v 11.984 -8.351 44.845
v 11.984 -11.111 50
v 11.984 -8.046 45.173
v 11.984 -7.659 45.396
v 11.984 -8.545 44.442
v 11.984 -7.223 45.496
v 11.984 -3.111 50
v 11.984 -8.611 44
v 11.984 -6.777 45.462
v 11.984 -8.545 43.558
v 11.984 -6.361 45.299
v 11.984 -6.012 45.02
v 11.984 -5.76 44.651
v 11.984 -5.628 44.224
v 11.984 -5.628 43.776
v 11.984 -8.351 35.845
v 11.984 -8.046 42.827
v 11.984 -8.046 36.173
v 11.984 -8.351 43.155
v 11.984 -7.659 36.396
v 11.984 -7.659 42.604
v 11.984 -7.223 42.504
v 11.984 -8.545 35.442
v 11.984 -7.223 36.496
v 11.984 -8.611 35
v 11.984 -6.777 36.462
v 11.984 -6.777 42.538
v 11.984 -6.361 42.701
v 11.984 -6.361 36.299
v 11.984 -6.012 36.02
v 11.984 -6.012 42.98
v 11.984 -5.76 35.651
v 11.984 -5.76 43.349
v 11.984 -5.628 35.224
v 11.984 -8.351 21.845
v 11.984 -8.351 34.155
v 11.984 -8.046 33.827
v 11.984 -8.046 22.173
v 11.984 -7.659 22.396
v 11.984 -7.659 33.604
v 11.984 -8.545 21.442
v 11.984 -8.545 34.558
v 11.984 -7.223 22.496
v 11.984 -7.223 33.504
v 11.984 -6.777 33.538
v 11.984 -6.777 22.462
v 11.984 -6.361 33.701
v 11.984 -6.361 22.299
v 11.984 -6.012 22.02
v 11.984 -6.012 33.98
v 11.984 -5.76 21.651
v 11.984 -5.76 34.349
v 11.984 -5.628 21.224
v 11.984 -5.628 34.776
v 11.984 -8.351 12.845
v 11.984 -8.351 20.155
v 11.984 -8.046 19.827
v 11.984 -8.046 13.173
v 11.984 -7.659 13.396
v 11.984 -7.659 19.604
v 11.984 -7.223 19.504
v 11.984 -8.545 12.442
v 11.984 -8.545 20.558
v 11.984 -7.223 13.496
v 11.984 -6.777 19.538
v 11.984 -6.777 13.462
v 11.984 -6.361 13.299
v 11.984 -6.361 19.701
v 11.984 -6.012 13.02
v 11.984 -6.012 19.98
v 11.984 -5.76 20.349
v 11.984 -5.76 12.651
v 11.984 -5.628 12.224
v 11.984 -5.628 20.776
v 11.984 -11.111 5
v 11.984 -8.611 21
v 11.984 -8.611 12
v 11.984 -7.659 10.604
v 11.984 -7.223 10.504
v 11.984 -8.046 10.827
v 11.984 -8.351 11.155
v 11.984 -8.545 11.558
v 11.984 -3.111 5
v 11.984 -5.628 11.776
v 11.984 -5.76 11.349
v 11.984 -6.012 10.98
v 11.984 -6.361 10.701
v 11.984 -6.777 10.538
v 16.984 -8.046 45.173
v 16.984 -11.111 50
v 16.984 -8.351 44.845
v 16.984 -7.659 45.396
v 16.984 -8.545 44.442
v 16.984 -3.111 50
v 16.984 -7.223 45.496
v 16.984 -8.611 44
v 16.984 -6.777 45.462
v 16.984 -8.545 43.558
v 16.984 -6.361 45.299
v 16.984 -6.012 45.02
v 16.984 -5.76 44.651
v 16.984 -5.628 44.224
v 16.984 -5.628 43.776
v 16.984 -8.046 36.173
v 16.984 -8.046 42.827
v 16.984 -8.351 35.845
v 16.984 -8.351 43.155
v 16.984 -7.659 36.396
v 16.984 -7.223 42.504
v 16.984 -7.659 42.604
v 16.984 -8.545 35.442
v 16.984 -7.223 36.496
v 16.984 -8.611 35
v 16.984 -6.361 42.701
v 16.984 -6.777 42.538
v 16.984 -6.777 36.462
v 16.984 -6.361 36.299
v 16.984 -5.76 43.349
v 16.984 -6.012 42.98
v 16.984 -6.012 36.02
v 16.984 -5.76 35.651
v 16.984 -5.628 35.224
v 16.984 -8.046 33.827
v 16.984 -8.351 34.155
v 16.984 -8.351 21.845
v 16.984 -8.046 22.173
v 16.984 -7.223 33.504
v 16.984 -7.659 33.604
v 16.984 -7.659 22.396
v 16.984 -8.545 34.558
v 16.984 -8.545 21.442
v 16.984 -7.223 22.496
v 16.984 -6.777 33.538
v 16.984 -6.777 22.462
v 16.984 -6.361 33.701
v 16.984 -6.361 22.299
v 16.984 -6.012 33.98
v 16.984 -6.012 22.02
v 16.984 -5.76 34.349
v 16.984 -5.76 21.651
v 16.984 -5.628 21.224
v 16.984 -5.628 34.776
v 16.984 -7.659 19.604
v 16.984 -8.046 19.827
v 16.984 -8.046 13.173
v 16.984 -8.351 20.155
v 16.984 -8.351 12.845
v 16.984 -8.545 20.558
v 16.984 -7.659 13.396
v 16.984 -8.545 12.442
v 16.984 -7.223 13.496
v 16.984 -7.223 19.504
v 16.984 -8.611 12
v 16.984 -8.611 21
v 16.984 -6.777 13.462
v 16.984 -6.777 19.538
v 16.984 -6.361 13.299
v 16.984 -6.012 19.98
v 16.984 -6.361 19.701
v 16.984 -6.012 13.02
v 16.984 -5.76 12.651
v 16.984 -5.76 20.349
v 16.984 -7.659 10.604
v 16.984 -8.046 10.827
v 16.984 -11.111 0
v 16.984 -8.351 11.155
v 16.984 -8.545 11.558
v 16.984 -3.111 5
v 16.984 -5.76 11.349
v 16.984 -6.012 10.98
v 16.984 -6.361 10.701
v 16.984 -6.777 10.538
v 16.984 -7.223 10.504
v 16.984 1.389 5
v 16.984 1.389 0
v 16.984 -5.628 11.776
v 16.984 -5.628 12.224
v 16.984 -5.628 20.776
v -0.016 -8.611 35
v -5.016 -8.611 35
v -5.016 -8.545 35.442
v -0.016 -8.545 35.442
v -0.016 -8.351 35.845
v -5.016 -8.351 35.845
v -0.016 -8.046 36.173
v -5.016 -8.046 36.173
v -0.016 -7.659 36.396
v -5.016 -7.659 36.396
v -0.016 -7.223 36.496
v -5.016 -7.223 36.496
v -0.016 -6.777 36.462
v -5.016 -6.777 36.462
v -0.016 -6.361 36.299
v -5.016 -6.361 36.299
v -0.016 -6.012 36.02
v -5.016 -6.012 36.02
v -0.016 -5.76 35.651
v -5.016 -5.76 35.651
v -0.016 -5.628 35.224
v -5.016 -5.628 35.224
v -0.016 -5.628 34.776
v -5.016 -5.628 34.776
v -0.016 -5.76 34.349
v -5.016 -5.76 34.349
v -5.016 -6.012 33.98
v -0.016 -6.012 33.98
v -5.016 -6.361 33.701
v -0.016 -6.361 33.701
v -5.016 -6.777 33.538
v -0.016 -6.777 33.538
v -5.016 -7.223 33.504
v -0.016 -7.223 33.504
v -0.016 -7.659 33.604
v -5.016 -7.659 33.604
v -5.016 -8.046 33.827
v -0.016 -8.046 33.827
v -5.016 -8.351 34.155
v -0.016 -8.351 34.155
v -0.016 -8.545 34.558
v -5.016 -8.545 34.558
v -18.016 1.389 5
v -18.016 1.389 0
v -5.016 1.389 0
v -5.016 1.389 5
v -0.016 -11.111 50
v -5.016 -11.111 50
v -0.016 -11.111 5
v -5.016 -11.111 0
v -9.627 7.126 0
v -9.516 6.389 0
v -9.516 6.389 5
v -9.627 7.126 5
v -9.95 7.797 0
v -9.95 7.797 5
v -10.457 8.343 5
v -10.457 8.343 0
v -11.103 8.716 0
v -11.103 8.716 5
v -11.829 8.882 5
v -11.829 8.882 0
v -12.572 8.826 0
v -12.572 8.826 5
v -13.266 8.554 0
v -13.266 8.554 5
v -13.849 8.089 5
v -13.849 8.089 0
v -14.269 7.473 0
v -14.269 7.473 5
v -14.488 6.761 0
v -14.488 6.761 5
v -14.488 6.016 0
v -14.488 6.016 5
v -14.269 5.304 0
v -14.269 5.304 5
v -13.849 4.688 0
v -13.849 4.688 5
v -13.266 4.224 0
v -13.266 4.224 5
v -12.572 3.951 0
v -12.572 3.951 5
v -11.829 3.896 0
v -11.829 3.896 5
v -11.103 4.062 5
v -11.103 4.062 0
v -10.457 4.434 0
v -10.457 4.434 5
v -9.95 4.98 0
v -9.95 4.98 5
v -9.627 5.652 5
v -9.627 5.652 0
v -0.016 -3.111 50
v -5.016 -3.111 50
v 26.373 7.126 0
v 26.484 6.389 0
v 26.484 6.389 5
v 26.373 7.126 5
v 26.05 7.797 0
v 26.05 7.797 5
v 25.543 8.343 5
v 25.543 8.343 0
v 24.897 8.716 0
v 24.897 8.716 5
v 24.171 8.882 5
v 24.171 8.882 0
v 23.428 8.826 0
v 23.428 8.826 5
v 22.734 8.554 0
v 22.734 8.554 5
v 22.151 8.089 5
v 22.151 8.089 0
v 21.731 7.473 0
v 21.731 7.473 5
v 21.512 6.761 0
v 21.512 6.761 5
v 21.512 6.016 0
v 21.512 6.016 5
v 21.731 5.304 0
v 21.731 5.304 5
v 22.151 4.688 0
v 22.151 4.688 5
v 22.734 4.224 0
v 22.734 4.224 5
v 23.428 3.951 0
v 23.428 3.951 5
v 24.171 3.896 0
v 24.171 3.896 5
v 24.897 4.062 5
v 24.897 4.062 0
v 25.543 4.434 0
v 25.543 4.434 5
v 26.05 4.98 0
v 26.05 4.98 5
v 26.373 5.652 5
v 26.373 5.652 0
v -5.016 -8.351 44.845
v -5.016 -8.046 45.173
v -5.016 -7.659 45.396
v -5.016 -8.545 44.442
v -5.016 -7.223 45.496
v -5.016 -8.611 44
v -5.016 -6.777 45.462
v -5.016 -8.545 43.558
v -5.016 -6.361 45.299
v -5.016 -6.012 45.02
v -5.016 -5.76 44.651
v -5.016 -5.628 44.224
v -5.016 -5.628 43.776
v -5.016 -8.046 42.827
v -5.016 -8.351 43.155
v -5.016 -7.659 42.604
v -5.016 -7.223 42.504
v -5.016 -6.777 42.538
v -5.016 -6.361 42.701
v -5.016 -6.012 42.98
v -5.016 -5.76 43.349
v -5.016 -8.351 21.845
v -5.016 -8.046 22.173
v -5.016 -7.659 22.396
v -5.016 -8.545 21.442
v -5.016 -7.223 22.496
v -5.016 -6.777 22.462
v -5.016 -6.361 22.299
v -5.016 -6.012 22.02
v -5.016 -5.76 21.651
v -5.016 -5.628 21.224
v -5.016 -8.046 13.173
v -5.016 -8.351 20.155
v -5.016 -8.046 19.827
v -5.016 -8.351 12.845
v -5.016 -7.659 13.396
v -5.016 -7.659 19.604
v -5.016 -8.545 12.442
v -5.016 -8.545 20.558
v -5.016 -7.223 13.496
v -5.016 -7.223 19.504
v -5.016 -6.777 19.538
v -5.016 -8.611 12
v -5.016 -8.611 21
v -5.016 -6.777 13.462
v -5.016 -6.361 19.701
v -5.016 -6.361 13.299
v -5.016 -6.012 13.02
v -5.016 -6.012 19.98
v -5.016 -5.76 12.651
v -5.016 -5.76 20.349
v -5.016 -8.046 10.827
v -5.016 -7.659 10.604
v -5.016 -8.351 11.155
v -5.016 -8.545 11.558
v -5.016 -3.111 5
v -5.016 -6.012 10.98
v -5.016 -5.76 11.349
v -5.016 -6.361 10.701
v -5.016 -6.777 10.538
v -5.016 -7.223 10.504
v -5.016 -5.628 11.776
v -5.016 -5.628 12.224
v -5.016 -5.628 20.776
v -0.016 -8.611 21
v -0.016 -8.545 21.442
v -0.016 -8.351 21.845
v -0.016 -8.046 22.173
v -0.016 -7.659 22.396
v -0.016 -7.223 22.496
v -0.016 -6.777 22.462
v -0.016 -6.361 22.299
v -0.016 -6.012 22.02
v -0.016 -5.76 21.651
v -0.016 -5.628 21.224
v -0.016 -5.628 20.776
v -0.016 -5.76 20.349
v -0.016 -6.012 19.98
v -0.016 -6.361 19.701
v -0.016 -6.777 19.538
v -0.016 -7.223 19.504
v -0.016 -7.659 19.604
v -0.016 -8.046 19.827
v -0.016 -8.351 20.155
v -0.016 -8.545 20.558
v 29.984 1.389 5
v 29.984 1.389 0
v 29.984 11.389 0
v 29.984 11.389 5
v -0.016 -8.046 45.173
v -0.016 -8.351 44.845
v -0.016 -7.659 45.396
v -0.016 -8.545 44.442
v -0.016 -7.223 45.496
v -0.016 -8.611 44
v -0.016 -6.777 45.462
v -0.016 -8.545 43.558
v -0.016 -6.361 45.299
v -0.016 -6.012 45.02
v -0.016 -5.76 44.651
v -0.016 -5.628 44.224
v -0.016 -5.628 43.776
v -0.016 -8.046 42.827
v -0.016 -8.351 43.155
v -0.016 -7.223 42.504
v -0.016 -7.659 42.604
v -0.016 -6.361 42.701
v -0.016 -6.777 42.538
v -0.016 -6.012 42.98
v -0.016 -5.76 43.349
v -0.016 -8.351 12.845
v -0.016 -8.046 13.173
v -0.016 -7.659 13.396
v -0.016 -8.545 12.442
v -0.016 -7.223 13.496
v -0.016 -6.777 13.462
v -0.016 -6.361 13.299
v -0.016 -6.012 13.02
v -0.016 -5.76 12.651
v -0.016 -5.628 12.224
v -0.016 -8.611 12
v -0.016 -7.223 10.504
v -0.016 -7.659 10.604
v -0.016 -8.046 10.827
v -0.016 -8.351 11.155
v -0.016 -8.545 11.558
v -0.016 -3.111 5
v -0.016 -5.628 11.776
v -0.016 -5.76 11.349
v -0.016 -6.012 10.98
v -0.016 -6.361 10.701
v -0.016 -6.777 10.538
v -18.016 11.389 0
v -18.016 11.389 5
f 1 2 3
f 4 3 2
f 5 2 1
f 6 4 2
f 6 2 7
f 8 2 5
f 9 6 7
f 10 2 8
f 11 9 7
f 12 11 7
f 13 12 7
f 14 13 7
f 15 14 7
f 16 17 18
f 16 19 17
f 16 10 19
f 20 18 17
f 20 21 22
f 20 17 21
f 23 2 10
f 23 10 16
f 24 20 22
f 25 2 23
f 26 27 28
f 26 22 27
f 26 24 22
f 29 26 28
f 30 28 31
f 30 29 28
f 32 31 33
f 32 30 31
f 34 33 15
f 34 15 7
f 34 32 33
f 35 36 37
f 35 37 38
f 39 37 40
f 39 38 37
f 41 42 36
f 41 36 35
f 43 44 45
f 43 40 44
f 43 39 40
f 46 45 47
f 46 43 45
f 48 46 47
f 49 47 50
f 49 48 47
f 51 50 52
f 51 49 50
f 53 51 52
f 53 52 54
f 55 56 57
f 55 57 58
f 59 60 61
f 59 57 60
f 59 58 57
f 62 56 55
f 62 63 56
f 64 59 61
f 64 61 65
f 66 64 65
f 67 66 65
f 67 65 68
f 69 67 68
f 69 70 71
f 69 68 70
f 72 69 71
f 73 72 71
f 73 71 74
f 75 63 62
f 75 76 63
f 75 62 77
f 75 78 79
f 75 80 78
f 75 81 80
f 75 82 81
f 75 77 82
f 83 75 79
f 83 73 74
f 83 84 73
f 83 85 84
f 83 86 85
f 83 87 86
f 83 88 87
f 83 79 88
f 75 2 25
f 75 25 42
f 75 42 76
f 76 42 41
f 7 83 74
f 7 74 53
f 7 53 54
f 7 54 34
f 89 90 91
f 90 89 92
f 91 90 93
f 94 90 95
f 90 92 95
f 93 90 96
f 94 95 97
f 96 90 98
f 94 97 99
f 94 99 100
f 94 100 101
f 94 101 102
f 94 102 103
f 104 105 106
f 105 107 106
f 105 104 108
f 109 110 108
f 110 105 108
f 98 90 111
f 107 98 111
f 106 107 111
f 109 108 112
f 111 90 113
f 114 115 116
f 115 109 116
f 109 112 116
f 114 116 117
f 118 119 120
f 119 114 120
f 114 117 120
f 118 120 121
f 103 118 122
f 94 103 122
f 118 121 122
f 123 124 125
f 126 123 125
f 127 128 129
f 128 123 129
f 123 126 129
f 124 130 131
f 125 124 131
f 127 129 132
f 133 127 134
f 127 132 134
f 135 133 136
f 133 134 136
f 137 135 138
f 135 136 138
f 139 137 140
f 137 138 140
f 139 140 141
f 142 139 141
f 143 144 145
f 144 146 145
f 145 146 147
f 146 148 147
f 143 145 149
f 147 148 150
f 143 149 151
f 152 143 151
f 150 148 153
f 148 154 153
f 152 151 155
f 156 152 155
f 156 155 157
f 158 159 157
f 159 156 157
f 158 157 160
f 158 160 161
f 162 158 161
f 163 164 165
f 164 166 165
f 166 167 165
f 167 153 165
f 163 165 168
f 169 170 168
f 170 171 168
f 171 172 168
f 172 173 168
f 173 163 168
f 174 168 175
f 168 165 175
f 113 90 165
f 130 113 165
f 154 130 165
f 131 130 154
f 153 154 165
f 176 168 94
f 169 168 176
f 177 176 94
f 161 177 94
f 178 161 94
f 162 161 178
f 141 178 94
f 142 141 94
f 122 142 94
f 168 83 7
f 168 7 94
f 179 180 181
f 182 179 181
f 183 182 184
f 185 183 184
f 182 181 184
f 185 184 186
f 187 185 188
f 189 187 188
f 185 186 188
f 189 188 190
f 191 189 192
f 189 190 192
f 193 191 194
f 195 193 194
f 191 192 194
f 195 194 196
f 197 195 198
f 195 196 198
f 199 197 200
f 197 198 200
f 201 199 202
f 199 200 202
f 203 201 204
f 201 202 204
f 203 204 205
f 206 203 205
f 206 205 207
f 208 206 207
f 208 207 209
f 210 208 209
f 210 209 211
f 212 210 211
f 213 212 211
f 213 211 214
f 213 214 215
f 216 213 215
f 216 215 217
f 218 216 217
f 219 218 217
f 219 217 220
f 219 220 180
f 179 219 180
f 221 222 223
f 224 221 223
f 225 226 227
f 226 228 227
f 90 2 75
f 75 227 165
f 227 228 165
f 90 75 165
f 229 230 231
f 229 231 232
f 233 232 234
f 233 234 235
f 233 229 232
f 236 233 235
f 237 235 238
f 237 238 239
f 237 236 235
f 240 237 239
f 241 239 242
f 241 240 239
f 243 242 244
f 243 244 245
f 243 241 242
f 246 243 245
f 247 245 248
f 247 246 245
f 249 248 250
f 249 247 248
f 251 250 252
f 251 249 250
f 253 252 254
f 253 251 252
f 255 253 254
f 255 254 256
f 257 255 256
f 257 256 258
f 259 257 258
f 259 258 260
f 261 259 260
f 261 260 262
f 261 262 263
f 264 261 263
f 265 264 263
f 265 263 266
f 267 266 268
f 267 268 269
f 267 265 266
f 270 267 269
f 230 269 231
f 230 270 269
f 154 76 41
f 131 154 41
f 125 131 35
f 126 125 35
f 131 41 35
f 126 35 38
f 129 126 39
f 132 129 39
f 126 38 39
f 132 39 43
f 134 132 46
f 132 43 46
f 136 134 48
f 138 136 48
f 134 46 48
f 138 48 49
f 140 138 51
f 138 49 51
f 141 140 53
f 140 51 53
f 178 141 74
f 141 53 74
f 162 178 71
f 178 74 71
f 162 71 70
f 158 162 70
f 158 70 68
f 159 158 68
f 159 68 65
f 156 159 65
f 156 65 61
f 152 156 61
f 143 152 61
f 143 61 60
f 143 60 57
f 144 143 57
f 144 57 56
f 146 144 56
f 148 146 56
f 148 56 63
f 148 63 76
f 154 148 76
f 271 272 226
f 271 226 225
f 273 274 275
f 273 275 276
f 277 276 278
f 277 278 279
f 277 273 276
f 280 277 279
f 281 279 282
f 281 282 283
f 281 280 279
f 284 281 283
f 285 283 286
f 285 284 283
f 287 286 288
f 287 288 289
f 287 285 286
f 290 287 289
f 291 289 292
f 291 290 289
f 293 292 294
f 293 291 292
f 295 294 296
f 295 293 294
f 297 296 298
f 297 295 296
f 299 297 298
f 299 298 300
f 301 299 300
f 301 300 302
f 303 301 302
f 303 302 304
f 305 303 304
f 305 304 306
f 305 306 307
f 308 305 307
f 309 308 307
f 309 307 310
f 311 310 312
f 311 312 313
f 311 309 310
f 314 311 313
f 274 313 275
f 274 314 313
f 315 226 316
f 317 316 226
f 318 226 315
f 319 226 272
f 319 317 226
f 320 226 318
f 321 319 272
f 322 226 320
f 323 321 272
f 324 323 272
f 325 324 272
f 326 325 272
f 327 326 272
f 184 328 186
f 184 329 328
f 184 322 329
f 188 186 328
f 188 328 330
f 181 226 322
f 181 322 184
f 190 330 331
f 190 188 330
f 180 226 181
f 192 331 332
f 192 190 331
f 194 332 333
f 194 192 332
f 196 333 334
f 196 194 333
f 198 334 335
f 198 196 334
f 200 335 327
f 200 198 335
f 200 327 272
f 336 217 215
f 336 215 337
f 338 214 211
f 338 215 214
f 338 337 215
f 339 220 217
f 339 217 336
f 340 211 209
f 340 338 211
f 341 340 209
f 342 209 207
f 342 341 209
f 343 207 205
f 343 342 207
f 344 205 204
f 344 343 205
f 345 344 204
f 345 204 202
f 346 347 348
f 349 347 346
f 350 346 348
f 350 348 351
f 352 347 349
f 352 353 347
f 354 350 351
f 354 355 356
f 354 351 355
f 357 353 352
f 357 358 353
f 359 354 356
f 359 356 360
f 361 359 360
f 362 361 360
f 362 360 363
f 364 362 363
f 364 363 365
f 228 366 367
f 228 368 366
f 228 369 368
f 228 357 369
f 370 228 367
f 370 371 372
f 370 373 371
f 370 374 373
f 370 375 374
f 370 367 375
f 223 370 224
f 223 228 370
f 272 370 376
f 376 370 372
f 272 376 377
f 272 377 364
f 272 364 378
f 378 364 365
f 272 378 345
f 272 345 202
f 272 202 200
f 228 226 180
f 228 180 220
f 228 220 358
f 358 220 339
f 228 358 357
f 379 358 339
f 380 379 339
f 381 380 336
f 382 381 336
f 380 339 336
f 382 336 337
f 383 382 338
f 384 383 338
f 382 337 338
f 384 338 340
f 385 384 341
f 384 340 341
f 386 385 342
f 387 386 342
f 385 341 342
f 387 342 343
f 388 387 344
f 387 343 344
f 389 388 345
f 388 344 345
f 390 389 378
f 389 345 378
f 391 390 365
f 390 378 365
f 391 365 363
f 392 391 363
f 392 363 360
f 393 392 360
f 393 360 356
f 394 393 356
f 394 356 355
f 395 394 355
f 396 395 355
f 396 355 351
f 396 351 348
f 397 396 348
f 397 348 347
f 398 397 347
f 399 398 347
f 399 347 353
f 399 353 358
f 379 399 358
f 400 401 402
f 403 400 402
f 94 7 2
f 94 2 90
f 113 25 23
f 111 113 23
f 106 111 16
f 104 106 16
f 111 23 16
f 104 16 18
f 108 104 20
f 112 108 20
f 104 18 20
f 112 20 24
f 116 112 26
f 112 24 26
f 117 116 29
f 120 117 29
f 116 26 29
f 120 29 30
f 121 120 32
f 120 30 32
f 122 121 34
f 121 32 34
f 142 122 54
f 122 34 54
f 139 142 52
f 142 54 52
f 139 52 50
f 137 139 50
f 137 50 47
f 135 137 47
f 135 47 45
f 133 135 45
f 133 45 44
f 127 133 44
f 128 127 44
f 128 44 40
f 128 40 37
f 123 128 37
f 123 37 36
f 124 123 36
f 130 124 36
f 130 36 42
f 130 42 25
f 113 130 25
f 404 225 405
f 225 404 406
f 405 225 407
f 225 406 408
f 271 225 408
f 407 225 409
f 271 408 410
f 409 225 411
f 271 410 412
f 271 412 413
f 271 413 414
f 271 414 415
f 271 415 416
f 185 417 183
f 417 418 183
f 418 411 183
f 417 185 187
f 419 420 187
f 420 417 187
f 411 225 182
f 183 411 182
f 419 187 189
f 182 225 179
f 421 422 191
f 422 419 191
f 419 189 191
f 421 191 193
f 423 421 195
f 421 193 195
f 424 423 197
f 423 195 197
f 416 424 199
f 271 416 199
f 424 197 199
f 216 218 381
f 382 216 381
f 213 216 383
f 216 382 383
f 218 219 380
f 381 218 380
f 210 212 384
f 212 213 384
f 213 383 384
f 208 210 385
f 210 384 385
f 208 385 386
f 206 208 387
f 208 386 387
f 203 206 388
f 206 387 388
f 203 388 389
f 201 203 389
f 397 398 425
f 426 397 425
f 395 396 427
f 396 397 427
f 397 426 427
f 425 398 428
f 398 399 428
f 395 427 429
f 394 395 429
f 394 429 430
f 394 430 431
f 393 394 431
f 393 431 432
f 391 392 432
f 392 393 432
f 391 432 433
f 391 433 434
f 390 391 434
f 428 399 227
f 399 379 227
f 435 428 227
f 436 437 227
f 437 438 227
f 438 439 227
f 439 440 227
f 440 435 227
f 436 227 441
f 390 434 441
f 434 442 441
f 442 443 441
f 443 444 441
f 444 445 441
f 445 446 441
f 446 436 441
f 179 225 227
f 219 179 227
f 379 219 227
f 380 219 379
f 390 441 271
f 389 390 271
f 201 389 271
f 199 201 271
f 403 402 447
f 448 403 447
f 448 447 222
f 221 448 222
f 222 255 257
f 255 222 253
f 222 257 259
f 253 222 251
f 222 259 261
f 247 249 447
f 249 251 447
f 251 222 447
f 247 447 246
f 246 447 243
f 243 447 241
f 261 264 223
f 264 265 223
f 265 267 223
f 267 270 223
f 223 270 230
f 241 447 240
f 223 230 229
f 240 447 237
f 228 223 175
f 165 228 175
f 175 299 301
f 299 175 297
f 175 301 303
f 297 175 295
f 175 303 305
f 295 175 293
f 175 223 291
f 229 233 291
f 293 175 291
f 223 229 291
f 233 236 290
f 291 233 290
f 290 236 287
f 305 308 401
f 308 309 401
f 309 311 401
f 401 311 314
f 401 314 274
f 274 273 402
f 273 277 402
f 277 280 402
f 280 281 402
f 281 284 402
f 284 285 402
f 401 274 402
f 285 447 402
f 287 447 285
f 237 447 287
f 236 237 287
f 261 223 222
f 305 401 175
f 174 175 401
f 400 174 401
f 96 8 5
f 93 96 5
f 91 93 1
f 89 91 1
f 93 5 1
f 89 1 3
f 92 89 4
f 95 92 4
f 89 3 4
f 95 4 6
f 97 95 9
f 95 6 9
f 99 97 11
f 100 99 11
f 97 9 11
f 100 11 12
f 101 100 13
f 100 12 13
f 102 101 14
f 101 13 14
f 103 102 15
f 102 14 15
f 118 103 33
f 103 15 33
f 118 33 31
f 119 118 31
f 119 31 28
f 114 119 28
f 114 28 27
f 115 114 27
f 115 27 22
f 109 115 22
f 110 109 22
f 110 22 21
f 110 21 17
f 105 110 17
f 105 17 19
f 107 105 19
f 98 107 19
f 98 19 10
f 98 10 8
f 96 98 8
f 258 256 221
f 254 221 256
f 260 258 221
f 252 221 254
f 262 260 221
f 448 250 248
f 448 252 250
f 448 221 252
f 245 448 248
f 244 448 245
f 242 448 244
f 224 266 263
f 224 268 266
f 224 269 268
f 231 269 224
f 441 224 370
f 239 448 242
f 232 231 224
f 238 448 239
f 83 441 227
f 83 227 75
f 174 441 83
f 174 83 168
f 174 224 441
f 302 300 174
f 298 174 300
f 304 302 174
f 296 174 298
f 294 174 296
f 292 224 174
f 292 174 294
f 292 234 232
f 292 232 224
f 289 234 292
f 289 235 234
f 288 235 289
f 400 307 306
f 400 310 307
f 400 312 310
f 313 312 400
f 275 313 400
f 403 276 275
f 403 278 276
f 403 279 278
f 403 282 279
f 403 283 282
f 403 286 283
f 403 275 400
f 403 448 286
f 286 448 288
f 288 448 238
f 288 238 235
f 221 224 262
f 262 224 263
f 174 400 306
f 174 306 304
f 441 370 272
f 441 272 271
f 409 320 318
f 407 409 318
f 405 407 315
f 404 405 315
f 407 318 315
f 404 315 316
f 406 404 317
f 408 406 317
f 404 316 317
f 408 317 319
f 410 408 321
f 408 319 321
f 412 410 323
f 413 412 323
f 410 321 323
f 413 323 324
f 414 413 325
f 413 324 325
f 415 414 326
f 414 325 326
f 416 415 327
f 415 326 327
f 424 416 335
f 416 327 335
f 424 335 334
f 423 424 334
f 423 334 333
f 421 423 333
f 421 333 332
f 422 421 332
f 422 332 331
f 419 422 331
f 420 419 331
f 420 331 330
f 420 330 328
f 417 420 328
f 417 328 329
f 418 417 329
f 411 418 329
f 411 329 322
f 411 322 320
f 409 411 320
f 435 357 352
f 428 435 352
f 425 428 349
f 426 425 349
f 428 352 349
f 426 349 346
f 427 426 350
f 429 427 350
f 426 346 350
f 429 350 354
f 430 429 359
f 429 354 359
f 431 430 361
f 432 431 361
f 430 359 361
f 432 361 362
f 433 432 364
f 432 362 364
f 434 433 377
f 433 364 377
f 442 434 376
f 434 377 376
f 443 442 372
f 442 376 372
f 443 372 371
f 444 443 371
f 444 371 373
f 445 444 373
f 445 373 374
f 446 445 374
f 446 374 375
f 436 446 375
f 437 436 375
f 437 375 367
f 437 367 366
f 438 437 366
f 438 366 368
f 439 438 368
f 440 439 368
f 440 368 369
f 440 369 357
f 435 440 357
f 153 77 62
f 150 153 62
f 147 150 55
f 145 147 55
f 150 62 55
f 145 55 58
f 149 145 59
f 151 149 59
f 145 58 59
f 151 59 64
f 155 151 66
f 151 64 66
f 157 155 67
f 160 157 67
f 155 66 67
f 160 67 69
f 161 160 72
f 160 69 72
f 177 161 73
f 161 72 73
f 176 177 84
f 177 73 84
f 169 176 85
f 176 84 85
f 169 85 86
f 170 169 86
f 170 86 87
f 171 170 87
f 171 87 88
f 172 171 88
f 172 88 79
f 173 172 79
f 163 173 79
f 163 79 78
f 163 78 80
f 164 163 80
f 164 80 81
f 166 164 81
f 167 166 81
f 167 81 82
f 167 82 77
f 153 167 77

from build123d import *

# Parameters (mm, degrees)
SKETCH_1_R          = 2.5
SKETCH_1_W          = 22
SKETCH_1_H          = 12.5
SKETCH_1_H_2        = 5
EXTRUDE_2_DEPTH     = 5
SKETCH_2_W          = 5
SKETCH_2_H          = 8
EXTRUDE_3_DEPTH     = 45
SKETCH_3_R          = 1.5
CUT_EXTRUDE_1_DEPTH = 45
SKETCH_5_R          = 1.5
CUT_EXTRUDE_2_DEPTH = 45


with BuildPart() as part:
    # 草图1 → 凸台-拉伸2 (new body)
    # profile 1 of 3: a face of its own
    with BuildSketch(Plane.XY):
        Polygon((29.983914209, 11.388739946), (-18.016085791, 11.388739946), (-18.016085791, 1.388739946), (-5.016085791, 1.388739946), (-5.016085791, 6.388739946), (16.983914209, 6.388739946), (16.983914209, 1.388739946), (29.983914209, 1.388739946), align=None)
        with Locations((-12.016085791, 6.388739946)):
            Circle(SKETCH_1_R, mode=Mode.SUBTRACT)
        with Locations((23.983914209, 6.388739946)):
            Circle(SKETCH_1_R, mode=Mode.SUBTRACT)
    # profile 2 of 3: a face of its own
    with BuildSketch(Plane.XY):
        with Locations((5.983914209, -4.861260054)):
            Rectangle(SKETCH_1_W, SKETCH_1_H)
    # profile 3 of 3: a face of its own
    with BuildSketch(Plane.XY):
        with Locations((5.983914209, 3.888739946)):
            Rectangle(SKETCH_1_W, SKETCH_1_H_2)
    extrude(amount=EXTRUDE_2_DEPTH)

    # 草图2 → 凸台-拉伸3 (add)
    with BuildSketch(Plane.XY.offset(5)):
        with Locations((-2.516085791, -7.111260054)):
            Rectangle(SKETCH_2_W, SKETCH_2_H)
        with Locations((14.483914209, -7.111260054)):
            Rectangle(SKETCH_2_W, SKETCH_2_H)
    extrude(amount=EXTRUDE_3_DEPTH)

    # 草图3 → 切除-拉伸1 (cut)
    with BuildSketch(Plane.ZY.offset(5.016085791)):
        with Locations(Location((21, -7.111260054, 0), (0, 0, 270))):
            Circle(SKETCH_3_R)
        with Locations(Location((35, -7.111260054, 0), (0, 0, 270))):
            Circle(SKETCH_3_R)
    extrude(amount=-CUT_EXTRUDE_1_DEPTH, mode=Mode.SUBTRACT)

    # 草图5 → 切除-拉伸2 (cut)
    with BuildSketch(Plane.ZY.offset(5.016085791)):
        with Locations(Location((44, -7.111260054, 0), (0, 0, 270))):
            Circle(SKETCH_5_R)
        with Locations(Location((12, -7.111260054, 0), (0, 0, 270))):
            Circle(SKETCH_5_R)
    extrude(amount=-CUT_EXTRUDE_2_DEPTH, mode=Mode.SUBTRACT)


solid = part.part
